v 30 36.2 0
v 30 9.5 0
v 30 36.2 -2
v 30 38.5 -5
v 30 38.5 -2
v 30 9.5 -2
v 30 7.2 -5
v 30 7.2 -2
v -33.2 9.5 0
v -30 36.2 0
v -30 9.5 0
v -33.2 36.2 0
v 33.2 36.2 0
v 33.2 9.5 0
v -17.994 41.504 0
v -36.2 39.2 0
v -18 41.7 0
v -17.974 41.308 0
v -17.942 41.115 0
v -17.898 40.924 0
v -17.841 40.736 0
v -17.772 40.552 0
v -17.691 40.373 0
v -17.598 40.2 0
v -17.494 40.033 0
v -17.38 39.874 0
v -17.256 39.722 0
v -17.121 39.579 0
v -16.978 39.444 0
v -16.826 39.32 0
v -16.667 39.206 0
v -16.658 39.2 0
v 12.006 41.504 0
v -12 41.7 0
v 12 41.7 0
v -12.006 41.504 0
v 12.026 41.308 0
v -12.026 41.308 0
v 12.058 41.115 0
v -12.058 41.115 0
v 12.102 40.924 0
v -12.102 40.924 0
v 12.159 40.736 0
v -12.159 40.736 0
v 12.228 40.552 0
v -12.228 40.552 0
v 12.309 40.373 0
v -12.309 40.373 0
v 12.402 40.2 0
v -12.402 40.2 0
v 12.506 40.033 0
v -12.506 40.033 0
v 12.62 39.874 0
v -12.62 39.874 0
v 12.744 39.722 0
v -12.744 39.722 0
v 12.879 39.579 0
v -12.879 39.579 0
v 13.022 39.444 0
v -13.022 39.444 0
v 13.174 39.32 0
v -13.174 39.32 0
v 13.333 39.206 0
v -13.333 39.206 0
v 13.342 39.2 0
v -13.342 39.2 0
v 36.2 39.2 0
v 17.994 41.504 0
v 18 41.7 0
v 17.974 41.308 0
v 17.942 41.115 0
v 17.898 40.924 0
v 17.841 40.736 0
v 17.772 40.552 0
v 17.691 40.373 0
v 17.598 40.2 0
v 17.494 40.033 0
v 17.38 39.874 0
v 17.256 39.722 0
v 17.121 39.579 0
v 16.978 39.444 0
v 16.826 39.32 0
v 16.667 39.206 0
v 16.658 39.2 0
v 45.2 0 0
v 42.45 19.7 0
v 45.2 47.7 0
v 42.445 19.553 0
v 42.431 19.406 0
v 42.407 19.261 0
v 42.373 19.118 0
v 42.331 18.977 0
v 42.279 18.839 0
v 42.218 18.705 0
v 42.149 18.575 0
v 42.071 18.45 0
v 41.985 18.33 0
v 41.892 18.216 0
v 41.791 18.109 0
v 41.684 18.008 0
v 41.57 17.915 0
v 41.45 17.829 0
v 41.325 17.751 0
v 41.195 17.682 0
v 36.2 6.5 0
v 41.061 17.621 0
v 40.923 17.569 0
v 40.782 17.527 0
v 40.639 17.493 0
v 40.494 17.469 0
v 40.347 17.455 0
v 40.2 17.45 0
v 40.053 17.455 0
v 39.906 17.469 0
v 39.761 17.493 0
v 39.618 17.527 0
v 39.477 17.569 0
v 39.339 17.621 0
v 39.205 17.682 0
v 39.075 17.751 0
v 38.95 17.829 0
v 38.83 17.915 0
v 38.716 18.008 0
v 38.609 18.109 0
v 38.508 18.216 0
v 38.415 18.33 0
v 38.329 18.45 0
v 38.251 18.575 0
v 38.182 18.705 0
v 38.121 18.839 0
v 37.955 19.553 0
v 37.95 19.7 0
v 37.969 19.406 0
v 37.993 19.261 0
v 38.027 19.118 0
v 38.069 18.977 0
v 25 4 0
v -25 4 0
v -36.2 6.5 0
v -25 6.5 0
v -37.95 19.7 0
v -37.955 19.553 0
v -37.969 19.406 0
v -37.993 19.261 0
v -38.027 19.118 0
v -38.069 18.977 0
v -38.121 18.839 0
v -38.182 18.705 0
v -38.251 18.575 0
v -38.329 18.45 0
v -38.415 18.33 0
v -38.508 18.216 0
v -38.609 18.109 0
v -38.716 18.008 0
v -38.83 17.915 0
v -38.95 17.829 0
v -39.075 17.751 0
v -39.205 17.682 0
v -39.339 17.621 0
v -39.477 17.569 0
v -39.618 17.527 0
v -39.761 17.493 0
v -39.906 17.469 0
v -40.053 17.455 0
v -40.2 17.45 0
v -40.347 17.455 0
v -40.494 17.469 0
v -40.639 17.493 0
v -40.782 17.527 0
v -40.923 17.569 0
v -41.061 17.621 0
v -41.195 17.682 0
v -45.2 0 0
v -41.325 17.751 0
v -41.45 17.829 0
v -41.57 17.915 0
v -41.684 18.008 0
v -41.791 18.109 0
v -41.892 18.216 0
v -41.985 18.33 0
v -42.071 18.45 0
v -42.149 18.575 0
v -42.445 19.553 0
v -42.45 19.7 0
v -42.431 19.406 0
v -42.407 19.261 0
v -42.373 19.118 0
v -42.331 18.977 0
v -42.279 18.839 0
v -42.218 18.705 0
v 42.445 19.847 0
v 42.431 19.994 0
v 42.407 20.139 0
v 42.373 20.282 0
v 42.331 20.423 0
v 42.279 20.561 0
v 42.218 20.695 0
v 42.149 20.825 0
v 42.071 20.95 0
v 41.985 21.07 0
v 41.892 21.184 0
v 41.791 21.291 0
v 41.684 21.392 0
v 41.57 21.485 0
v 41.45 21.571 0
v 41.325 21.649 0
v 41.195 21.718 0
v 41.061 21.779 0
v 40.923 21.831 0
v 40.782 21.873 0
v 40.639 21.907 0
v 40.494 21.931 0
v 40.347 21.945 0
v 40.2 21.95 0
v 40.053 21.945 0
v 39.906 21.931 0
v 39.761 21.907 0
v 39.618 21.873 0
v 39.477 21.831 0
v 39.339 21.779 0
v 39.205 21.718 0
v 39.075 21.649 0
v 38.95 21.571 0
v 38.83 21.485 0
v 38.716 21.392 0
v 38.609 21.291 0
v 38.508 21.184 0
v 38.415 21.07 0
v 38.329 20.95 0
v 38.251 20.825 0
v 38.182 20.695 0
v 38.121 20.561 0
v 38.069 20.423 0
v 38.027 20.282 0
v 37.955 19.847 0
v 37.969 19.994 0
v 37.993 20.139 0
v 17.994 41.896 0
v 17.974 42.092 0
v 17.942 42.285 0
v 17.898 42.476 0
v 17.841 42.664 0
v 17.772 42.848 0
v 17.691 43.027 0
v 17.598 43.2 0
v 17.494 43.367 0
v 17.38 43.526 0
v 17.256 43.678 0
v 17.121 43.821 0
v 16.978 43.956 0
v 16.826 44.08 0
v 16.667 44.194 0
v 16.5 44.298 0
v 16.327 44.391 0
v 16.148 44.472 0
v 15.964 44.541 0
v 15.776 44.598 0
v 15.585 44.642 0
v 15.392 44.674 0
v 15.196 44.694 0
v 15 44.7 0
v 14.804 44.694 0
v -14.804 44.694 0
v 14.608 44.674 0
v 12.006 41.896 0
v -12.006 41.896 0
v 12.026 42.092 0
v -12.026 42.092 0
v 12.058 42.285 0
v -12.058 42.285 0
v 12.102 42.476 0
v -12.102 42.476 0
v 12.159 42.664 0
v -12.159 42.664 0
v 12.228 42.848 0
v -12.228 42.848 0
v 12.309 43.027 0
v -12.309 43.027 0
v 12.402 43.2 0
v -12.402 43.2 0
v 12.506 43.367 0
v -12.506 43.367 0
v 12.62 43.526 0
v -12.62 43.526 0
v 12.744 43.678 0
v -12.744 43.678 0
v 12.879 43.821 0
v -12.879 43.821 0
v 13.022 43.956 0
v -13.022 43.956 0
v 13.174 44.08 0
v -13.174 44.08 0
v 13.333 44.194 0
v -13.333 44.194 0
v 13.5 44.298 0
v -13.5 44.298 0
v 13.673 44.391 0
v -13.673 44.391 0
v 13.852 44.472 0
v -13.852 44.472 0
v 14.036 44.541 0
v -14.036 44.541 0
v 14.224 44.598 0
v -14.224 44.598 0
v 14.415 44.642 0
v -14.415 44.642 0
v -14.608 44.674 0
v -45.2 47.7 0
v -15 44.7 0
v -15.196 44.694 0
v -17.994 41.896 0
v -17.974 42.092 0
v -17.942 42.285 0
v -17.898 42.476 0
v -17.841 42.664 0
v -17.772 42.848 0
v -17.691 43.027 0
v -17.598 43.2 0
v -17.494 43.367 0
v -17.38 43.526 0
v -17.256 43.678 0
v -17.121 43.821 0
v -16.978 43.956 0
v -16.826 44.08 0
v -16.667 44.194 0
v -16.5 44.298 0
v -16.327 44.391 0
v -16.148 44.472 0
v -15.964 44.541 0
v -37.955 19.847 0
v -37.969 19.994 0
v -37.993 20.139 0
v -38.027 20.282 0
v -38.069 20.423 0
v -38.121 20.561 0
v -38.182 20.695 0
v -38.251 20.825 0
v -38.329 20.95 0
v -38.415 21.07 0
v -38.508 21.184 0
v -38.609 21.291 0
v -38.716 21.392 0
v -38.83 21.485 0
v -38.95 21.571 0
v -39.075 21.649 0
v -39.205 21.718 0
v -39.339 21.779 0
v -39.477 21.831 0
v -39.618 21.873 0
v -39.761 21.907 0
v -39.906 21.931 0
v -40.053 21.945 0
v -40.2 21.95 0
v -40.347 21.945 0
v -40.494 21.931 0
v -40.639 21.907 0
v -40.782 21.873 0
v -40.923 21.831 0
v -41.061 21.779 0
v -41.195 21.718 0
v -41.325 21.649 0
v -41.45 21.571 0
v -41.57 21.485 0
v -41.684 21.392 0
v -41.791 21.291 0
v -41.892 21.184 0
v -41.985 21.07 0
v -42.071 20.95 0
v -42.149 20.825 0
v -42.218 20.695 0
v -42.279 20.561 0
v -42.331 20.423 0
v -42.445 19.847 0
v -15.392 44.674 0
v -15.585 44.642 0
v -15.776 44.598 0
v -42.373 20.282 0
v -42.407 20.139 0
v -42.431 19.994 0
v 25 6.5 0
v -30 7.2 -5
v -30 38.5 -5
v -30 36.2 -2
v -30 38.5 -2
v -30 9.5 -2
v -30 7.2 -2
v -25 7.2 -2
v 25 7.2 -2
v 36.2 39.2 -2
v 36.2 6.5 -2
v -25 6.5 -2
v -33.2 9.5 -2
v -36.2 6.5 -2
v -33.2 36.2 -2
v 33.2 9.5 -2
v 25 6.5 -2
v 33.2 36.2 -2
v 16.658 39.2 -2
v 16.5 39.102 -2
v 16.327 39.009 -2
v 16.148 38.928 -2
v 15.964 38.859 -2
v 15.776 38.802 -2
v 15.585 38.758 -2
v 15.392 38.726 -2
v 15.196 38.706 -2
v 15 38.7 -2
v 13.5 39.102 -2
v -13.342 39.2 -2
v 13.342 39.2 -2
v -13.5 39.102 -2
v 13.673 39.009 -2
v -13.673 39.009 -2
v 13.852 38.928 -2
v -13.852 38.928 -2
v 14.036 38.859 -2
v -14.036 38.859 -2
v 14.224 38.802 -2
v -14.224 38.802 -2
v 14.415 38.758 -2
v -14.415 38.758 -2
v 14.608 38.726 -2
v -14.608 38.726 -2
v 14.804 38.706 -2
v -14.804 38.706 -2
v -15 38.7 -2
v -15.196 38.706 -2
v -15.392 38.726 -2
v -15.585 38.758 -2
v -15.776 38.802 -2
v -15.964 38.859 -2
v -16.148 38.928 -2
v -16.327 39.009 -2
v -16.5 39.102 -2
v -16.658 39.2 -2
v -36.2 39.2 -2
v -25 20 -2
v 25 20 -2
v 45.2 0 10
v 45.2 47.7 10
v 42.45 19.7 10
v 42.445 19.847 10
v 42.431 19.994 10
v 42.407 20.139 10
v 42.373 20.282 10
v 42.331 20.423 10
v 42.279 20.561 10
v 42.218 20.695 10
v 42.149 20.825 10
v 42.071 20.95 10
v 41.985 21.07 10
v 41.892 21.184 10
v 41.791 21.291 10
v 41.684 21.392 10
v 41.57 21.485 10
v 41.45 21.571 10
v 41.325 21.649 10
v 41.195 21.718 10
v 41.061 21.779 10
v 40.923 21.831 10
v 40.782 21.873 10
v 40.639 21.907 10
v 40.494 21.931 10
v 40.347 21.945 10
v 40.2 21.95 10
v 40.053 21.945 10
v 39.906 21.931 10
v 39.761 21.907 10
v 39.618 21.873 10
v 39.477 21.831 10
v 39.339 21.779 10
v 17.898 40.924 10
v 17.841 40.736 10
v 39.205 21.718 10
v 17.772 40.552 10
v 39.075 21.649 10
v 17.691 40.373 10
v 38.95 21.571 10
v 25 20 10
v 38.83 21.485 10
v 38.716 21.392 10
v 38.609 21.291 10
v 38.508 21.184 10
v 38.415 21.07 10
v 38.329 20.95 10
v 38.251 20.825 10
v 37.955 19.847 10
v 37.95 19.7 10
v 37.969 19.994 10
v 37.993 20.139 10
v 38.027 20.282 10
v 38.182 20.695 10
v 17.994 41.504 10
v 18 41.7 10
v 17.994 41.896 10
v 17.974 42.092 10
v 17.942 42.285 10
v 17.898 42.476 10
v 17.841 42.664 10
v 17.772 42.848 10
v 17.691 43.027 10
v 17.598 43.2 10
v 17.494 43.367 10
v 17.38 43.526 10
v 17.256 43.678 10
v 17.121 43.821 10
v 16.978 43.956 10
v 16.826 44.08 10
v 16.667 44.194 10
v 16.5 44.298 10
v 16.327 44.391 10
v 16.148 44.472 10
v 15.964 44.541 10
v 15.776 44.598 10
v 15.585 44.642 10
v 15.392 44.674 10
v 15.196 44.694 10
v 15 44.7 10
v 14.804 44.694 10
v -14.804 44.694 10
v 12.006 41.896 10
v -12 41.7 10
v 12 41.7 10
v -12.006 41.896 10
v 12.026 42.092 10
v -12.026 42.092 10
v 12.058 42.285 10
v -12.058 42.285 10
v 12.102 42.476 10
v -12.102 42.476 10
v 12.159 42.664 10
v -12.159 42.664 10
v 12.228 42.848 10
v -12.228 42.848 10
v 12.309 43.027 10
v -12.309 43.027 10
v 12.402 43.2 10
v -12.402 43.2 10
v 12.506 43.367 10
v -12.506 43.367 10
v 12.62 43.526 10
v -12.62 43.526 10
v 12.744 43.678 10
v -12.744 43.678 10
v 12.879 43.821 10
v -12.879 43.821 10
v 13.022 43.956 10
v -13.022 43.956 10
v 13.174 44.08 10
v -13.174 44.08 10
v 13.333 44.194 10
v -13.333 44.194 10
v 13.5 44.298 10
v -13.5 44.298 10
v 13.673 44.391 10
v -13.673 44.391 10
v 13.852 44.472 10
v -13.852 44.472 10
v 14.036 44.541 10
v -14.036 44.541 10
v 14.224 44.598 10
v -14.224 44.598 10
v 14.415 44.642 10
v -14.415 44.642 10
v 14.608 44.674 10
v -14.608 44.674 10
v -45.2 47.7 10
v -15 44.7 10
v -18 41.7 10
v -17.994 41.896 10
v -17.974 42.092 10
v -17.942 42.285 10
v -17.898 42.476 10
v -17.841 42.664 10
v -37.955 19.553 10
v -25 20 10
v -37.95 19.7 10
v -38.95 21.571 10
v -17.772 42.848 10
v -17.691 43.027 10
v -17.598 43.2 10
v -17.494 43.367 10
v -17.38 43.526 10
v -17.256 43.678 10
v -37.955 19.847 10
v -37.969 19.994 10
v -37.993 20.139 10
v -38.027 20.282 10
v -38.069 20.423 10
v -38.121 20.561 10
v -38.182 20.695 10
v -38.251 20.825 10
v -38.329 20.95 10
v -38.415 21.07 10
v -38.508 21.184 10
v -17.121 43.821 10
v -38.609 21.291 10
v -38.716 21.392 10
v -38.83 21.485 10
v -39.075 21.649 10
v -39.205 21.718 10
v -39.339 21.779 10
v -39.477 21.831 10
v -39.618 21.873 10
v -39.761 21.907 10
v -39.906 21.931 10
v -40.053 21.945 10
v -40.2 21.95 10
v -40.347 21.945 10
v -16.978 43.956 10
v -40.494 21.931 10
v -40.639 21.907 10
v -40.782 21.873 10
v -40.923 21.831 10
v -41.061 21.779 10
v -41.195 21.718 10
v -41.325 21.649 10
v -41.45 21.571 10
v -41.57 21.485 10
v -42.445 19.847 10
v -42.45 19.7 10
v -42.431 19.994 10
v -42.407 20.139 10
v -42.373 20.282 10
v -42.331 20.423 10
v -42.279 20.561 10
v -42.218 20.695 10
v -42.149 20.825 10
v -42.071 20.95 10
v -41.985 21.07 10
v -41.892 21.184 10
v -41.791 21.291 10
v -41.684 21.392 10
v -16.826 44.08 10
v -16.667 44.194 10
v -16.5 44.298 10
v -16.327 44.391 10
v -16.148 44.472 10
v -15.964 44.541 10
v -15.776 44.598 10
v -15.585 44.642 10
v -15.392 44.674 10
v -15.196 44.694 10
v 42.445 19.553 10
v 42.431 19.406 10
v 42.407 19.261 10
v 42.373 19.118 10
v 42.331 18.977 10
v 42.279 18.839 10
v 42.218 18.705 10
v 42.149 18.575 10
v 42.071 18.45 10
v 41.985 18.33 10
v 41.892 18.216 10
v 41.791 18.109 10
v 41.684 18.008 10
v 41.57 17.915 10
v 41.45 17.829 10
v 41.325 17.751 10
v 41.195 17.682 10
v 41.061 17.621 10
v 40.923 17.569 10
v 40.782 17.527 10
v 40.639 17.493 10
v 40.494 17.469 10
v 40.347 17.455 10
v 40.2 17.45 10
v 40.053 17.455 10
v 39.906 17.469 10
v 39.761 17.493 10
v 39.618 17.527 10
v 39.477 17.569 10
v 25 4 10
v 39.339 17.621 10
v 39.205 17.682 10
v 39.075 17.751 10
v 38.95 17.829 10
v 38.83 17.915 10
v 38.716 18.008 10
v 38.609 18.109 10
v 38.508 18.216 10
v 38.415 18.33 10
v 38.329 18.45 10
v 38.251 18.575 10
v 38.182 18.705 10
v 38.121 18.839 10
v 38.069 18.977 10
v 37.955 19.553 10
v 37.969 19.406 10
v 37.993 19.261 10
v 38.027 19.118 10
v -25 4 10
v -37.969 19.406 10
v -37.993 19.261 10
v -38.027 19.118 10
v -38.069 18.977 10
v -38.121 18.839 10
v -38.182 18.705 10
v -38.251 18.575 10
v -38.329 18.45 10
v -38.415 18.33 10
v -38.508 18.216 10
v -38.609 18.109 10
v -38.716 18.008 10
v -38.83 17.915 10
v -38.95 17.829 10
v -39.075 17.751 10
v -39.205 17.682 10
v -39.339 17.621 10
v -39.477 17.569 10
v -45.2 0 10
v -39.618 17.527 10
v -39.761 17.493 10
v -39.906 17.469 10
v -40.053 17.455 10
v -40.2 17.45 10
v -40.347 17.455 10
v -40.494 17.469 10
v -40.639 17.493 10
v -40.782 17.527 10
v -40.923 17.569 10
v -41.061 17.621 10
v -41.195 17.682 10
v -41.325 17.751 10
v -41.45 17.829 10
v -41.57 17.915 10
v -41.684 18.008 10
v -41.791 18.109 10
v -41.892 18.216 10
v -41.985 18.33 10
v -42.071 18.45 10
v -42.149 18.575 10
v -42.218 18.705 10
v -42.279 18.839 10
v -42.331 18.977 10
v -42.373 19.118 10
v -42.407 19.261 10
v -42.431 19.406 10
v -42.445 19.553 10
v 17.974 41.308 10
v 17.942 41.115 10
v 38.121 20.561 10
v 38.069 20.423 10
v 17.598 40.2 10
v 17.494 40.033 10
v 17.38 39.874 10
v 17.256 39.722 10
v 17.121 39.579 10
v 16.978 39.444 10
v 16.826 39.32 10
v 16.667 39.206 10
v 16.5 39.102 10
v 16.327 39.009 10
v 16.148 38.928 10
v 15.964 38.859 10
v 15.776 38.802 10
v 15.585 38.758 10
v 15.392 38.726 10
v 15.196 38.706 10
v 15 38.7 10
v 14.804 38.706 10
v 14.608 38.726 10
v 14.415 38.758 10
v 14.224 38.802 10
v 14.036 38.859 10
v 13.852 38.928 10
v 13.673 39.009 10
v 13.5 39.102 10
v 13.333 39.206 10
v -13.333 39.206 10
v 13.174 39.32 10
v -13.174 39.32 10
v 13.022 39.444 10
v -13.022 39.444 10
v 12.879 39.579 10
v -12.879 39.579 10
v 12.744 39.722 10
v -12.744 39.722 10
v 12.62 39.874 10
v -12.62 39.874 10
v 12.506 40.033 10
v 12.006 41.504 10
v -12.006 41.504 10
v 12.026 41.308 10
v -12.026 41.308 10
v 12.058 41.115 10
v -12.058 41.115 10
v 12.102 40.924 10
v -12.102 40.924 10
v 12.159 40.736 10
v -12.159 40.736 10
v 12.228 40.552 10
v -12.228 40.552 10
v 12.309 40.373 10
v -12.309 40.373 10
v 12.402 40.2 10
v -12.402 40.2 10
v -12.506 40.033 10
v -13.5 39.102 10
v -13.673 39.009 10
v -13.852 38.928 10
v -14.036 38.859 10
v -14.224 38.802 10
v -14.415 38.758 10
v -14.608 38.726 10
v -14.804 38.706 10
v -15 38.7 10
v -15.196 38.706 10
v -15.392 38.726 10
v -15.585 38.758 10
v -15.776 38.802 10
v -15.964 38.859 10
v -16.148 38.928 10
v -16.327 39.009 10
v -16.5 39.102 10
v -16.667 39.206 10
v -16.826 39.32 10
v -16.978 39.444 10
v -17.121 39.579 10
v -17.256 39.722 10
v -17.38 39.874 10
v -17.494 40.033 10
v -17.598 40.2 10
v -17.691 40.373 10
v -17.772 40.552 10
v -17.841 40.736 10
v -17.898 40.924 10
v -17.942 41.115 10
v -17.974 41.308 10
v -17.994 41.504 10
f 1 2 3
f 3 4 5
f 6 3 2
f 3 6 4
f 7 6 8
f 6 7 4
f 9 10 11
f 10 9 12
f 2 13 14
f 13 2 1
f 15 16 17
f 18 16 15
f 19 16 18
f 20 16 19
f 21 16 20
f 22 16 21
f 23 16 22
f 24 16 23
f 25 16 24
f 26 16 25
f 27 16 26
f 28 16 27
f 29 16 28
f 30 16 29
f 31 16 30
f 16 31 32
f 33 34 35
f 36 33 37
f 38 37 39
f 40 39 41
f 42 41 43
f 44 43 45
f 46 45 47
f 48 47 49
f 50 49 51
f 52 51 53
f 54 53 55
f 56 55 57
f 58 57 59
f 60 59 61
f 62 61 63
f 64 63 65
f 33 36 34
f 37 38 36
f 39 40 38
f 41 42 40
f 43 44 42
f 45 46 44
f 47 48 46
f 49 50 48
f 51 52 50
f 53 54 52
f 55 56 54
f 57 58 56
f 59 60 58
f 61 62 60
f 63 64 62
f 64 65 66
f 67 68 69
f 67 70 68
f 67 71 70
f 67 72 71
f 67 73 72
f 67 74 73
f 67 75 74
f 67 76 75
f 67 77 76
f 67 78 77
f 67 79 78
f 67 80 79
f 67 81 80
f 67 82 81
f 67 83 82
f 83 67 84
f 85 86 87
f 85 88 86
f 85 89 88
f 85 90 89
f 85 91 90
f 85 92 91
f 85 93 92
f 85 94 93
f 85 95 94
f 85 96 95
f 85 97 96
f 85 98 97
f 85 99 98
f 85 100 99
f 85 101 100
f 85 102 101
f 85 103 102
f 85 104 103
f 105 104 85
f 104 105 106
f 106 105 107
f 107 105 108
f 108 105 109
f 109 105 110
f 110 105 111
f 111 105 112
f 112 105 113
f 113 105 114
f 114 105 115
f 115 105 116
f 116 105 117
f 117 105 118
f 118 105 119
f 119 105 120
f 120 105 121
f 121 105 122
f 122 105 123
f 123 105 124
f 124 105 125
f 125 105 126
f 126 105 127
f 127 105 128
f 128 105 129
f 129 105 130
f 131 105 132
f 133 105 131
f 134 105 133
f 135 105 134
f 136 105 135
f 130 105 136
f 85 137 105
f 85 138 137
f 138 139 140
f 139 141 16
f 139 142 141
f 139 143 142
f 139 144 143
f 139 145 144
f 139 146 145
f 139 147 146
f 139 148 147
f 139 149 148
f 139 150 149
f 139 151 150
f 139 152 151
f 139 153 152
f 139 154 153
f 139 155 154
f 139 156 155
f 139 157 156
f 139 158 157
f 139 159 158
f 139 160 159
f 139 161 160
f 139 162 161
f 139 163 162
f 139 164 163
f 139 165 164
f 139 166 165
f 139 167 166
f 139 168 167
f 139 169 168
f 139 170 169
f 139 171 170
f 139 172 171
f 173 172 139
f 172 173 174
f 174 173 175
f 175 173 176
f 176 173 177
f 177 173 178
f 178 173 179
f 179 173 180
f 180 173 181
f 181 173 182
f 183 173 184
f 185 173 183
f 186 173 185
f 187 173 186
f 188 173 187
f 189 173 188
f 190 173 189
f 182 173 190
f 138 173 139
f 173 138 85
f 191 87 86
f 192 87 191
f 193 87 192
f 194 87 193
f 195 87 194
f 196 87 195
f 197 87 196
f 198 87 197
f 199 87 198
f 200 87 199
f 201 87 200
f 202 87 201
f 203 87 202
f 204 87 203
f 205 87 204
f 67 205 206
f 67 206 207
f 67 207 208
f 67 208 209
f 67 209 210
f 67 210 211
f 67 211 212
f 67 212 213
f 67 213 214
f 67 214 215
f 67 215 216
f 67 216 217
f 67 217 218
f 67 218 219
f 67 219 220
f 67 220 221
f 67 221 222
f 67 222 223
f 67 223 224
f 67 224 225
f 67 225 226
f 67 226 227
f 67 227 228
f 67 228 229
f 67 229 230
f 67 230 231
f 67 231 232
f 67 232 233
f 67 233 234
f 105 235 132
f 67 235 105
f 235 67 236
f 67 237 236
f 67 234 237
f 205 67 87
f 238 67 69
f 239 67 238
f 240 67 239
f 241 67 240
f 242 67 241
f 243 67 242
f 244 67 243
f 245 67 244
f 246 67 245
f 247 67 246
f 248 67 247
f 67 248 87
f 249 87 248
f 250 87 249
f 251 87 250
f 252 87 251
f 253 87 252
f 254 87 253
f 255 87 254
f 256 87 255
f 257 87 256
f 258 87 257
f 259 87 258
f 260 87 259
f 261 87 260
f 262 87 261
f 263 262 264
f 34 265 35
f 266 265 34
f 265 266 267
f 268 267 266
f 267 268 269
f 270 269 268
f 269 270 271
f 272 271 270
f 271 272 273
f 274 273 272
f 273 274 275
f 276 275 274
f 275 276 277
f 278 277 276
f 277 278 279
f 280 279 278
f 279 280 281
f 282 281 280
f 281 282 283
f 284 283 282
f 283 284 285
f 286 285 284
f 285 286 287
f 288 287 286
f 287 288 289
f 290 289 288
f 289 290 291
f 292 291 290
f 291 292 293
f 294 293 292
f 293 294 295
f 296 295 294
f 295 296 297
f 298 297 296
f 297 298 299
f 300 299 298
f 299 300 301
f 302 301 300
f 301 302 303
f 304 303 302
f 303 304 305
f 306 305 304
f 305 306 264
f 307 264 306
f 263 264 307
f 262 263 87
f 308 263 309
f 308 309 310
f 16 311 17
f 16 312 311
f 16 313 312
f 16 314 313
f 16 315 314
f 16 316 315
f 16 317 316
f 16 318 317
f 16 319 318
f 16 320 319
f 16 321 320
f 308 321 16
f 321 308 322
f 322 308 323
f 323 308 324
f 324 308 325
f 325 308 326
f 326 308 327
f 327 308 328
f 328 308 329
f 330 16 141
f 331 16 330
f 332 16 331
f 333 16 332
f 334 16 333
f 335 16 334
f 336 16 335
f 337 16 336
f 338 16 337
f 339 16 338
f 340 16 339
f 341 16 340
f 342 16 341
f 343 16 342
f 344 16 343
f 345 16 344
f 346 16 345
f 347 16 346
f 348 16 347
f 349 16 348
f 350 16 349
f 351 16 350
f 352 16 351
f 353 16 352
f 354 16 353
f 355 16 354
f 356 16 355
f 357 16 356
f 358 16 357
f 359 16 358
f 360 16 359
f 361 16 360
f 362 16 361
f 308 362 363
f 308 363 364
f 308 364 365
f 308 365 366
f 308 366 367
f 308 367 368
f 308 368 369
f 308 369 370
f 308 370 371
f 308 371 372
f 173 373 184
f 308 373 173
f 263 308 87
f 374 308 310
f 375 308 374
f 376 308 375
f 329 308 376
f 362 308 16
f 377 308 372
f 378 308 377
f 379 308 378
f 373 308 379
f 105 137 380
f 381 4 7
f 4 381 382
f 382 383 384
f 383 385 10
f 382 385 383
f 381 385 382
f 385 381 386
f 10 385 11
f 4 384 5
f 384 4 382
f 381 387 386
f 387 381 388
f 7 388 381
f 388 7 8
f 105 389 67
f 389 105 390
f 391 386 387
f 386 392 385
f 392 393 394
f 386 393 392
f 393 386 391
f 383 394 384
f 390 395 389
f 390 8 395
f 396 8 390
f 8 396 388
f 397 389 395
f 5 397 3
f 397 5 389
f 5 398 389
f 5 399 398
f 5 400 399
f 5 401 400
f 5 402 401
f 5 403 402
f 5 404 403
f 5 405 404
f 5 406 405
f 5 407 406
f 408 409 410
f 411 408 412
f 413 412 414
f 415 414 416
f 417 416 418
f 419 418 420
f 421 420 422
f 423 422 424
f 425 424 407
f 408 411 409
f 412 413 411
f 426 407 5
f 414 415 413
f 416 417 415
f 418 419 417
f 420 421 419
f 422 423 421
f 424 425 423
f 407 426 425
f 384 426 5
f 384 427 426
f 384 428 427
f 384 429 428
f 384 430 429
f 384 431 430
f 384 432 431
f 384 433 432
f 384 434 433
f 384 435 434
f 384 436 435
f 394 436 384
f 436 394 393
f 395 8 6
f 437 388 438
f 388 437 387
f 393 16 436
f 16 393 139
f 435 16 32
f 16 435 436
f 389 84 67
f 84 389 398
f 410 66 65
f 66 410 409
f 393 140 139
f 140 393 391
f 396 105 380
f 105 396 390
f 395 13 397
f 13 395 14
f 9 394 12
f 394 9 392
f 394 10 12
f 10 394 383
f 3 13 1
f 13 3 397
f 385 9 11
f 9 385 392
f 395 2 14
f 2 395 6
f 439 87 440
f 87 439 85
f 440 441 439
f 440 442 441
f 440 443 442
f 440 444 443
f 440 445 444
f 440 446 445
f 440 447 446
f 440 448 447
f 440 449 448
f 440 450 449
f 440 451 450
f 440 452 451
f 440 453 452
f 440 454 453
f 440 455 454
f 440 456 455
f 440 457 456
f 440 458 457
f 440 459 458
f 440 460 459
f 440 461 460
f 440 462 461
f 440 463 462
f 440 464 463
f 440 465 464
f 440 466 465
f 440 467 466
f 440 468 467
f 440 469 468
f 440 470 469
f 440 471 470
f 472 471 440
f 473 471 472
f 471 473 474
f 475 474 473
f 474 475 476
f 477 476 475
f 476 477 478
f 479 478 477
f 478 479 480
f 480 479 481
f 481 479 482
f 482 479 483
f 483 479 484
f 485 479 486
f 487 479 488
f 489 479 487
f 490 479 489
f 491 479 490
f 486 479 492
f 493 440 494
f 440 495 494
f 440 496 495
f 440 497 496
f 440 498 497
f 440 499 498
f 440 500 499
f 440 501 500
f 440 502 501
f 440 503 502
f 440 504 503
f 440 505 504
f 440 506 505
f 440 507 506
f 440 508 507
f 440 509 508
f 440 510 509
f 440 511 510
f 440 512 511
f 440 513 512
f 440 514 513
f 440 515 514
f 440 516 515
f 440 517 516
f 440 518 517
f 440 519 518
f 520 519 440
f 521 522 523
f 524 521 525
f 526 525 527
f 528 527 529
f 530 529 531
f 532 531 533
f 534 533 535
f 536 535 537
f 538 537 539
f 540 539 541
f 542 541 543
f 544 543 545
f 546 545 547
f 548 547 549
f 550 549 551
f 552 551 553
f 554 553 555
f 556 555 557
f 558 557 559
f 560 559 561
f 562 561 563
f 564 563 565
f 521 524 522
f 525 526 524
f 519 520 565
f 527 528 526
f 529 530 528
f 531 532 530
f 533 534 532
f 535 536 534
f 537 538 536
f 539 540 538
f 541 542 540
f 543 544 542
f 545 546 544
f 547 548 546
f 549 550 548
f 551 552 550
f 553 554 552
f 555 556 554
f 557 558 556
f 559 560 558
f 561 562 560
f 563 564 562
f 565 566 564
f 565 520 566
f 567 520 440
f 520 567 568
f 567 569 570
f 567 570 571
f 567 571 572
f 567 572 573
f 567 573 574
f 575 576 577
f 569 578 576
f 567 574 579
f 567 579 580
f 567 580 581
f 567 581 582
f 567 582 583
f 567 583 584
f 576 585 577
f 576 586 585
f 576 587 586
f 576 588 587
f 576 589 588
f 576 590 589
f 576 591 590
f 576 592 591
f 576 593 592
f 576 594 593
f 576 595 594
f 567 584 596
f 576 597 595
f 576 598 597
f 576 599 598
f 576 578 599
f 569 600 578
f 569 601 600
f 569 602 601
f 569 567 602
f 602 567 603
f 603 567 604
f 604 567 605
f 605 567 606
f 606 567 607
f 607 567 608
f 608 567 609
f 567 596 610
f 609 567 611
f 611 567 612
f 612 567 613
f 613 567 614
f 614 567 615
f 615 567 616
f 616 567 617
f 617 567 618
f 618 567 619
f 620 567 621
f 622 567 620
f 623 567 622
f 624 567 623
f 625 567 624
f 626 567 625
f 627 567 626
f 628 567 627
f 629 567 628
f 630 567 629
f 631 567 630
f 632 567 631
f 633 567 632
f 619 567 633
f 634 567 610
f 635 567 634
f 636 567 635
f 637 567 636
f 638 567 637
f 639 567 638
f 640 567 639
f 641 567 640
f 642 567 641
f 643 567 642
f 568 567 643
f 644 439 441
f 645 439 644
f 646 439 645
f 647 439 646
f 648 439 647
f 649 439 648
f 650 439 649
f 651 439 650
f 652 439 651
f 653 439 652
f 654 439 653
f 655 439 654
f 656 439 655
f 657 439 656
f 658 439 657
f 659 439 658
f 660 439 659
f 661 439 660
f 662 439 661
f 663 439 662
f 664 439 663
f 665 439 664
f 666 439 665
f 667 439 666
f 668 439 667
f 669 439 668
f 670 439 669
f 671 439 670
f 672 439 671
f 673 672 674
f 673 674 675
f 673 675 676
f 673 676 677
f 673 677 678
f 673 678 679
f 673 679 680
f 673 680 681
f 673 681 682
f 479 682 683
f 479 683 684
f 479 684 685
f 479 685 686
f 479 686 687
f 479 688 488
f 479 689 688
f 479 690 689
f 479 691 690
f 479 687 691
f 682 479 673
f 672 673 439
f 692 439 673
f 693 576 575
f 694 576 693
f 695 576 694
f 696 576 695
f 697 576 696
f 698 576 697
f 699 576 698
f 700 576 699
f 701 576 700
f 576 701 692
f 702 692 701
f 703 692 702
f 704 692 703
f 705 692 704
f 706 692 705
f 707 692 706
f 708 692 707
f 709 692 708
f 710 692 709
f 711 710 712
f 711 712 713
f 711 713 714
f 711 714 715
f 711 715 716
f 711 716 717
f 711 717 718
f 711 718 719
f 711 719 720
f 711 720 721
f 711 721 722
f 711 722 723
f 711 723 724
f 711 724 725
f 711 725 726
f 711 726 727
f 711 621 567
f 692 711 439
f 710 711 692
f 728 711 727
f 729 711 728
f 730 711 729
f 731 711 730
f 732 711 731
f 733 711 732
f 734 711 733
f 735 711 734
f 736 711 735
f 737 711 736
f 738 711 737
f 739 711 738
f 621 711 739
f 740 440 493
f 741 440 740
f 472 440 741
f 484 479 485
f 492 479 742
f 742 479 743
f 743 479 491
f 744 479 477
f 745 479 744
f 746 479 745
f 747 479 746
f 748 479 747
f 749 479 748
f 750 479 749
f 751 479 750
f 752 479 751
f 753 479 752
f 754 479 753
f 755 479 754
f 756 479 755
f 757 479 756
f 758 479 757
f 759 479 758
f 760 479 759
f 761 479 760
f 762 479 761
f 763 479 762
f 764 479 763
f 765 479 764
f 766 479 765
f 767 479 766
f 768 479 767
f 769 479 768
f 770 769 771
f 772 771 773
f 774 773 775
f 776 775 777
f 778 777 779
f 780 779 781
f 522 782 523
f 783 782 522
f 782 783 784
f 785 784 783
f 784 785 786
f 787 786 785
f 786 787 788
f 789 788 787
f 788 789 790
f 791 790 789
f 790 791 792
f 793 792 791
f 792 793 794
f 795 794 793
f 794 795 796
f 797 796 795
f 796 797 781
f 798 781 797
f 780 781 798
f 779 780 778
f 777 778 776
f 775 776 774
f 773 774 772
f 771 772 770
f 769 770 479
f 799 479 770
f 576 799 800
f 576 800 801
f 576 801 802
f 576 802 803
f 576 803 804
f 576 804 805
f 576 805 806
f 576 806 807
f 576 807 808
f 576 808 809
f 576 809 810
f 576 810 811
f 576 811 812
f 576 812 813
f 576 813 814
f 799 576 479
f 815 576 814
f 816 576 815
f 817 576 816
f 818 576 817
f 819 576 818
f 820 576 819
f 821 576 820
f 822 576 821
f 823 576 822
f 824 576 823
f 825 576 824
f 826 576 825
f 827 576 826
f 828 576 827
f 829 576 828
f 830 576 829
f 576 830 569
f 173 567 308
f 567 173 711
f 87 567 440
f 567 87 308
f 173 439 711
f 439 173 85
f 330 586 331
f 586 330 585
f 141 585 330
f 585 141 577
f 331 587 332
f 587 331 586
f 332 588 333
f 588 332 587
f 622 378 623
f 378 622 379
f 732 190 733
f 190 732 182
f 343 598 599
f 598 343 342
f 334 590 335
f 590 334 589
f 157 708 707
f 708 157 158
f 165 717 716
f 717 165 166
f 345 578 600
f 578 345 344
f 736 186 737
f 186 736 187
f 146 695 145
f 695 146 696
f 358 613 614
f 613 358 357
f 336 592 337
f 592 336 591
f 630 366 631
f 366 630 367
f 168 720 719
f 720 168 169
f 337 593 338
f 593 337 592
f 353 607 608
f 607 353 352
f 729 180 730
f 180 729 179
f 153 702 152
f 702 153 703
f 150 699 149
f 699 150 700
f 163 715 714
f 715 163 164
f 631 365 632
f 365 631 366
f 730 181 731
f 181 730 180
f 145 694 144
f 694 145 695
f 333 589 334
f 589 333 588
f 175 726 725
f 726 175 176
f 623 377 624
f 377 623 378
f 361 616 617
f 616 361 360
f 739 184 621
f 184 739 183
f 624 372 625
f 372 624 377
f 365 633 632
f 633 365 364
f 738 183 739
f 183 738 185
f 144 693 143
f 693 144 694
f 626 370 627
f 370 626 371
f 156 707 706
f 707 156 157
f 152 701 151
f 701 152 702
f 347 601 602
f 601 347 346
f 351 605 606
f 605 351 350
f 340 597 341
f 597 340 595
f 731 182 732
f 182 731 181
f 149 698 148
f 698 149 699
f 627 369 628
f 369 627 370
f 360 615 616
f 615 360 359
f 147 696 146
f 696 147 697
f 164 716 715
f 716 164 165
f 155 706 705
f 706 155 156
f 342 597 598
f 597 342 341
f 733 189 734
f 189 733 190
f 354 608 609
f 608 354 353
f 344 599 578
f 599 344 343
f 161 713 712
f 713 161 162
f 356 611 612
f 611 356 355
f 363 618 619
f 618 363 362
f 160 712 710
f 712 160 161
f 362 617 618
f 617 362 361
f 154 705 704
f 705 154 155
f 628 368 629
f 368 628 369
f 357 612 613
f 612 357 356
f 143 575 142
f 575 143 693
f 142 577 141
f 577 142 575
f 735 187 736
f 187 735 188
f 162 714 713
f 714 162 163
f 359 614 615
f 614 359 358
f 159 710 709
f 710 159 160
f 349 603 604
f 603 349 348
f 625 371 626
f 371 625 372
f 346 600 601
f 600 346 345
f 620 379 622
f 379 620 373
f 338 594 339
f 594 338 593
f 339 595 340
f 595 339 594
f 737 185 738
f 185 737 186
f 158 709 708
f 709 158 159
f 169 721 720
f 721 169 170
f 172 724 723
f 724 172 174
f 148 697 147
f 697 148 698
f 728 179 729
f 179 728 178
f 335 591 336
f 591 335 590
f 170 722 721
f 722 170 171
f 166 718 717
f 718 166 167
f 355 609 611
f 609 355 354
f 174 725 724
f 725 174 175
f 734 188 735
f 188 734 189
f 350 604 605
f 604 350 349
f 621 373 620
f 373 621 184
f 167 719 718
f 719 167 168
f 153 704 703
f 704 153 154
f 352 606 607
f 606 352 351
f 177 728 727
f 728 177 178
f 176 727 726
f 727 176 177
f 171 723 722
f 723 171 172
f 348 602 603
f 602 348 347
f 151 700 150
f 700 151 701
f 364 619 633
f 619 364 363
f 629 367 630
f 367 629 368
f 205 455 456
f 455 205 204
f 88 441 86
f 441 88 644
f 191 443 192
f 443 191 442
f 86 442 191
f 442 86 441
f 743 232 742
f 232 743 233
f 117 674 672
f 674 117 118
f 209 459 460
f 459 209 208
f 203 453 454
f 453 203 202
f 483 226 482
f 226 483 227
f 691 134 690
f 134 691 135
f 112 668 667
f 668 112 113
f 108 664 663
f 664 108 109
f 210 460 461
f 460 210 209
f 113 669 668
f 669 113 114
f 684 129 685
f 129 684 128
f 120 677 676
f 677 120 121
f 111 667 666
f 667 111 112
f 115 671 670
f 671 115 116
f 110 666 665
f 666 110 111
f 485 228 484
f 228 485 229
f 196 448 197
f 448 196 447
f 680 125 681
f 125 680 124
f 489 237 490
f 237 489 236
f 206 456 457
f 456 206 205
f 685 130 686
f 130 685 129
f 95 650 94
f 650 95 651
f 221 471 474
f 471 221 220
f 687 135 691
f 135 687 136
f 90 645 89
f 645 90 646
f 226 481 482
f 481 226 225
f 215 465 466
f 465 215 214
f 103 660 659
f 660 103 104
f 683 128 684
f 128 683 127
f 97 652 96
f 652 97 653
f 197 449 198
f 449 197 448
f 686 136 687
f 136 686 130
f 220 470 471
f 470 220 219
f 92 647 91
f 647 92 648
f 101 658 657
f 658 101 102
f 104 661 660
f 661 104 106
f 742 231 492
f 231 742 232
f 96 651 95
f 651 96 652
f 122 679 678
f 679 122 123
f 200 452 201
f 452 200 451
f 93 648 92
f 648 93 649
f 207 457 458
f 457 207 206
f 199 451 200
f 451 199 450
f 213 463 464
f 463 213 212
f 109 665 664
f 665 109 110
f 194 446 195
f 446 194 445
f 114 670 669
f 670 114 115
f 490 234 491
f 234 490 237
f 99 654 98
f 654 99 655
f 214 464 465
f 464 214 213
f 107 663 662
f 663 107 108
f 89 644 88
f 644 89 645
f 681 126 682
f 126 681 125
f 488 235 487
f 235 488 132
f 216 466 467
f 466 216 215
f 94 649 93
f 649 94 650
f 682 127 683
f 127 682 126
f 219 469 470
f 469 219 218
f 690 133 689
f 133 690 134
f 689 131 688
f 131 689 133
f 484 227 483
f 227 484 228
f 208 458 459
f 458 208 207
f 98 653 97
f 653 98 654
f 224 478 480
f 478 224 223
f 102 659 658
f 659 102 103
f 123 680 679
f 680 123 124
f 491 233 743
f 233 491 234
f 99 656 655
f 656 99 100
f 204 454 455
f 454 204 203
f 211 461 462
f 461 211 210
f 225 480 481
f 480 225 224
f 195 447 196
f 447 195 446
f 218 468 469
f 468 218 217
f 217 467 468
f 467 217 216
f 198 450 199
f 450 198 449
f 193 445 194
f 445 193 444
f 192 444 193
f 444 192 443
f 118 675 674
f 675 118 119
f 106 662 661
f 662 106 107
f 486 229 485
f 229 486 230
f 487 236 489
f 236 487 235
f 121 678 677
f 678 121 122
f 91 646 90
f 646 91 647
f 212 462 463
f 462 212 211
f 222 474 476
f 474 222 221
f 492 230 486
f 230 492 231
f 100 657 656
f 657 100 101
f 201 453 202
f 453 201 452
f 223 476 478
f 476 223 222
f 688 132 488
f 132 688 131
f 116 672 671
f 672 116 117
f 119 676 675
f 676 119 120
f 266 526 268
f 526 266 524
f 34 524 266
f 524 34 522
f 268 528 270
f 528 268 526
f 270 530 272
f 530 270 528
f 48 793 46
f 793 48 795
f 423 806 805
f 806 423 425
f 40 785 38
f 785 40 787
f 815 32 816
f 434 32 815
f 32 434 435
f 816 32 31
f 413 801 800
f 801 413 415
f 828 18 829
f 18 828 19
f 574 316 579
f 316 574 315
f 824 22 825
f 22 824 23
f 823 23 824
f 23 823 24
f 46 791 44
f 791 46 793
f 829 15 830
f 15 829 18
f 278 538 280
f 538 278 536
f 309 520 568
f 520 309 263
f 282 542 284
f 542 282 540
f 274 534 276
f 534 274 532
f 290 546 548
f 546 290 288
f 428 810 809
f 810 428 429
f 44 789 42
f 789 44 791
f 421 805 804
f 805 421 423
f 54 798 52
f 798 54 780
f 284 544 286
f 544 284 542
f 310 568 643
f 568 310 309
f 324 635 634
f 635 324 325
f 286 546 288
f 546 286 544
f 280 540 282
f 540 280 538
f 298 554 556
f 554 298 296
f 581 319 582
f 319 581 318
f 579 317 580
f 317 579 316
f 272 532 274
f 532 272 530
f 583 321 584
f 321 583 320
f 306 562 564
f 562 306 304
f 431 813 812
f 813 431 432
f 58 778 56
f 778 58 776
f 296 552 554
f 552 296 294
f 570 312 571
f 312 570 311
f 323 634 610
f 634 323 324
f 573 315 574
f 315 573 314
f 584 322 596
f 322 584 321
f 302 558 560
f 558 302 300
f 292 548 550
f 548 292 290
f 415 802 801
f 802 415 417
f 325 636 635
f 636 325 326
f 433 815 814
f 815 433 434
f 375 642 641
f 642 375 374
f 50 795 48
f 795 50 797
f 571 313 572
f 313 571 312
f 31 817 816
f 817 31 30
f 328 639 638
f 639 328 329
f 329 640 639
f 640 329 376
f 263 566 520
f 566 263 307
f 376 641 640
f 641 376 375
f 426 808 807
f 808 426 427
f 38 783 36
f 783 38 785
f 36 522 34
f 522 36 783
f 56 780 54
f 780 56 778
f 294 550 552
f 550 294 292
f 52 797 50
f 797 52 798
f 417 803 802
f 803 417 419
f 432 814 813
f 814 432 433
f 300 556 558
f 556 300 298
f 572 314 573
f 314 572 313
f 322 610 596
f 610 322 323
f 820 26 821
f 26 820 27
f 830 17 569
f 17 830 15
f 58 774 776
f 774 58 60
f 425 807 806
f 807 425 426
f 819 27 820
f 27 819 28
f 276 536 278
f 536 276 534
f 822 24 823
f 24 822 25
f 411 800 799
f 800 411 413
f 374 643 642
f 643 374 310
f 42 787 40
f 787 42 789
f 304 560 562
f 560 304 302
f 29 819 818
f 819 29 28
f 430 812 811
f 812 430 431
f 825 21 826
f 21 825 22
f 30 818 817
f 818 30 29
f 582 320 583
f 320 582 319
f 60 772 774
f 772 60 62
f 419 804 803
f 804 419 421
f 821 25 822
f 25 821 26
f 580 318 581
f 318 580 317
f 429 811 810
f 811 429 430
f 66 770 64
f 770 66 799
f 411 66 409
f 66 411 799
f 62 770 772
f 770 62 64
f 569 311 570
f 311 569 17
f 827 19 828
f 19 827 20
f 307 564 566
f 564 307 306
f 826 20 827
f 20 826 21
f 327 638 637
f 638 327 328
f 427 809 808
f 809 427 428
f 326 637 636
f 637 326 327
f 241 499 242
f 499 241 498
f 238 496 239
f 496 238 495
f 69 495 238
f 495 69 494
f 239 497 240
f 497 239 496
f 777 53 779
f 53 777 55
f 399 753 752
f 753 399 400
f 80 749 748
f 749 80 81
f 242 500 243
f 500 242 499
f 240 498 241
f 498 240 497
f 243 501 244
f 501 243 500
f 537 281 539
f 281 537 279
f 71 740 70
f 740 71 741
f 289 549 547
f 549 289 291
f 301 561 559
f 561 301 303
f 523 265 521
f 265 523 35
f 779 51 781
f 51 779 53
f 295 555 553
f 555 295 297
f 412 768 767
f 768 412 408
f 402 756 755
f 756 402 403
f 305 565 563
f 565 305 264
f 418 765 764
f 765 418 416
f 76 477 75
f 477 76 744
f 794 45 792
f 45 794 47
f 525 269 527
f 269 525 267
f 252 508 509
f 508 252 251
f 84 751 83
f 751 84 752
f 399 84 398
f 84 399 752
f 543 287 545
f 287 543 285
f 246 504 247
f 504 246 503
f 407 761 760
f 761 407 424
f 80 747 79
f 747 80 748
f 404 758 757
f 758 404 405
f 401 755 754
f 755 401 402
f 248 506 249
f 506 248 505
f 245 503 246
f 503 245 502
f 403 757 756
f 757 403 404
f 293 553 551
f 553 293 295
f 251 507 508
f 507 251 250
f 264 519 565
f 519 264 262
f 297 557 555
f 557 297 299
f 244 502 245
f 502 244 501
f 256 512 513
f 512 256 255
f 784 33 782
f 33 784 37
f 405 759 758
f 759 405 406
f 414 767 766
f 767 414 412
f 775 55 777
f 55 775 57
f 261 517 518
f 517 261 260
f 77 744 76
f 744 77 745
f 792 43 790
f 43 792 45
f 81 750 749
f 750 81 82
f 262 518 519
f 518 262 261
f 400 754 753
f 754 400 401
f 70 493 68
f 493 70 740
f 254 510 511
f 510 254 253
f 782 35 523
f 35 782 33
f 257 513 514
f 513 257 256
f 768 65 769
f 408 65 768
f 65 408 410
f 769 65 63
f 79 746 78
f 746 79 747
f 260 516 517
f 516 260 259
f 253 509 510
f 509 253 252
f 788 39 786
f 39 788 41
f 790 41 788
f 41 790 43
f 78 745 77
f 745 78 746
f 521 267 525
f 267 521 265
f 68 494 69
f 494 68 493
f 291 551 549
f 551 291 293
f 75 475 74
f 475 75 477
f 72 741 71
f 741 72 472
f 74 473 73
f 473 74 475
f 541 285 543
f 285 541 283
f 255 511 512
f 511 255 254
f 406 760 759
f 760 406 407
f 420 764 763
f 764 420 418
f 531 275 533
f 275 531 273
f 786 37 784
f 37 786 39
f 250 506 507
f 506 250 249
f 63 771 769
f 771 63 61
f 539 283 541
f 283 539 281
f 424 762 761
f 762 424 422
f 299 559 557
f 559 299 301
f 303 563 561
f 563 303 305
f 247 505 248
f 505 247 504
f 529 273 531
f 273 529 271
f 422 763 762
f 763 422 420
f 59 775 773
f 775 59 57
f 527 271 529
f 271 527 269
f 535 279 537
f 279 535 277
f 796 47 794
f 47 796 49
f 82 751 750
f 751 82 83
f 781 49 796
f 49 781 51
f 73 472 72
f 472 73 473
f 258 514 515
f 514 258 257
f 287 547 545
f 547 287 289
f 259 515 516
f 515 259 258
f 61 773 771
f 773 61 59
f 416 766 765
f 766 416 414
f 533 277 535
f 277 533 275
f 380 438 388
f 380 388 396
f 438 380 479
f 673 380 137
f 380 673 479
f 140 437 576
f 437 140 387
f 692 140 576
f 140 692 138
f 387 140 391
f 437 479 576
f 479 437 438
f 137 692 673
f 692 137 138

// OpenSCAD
// =====================================================================
// child_cam_lid.scad — カメラポッド 押え蓋 (2個印刷)
//
// child_shell_fwd のカメラポッドに落とし込んだ DJI Osmo Action 6 を
// 上から押さえる。M4 蝶ボルト 2 本で着脱 (数秒)。
// 押えパッドの下面に 2mm EVA スポンジを貼り、締めると 0.6mm 潰れて
// カメラをポッド底の位置決めパッドへ押し付ける = Z の再現性が出る。
//
// 座標系 (この部品のローカル):
//   x = 0    : ポッドの X 中心 (レンズ軸。lens_dx=0 のとき)
//   y = 0    : ポッド後壁の外面
//   z = 0    : ポッド側壁の上端 (child_shell_fwd の pod_top)
//   → アセンブリでは translate([±75, 70.3, 145]) で置く
//
// 印刷向き: **上下逆さま** (z=lid_t の平面をベッドに置く)。
//   押えパッド・位置決めリムが上を向き、サポート不要。
// =====================================================================

/* [カメラ / ポッド (child_shell_fwd と一致させること)] */
cam_w     = 72.8;
cam_h     = 47.2;
cam_d     = 33.1;
cam_clr   = 0.6;
lens_y    = 110;
cam_ax_z  = 115;
pod_wall  = 7;
pod_rear  = 6;
hood      = 8;
pod_top   = 145;
lid_sc_y  = 90;             // 蓋ねじの y (グローバル)

/* [蓋] */
lid_t     = 10;             // 板厚
lid_ov    = 1.5;            // ポッド側壁より外へ出す量 (ねじの端距離 + 水切り)
m4_d      = 4.5;            // M4 蝶ボルト クリアランス
base_line = 150;            // 外形枠チェック用 (child_shell_fwd と一致)
foam_t    = 2.0;            // 押えパッドに貼る EVA スポンジ厚
preload   = 0.6;            // 締結時のスポンジ潰し代
pad_w     = 26;             // 押えパッド 幅 (Y)
pad_hw    = 30;             // 同 半幅 (X)
rim_t     = 3;              // 位置決めリム 幅
rim_h     = 2;              // 同 高さ
rim_clr   = 0.5;            // 同 クレードルとのすきま (片側)

/* [上面ボタンのアクセス窓 — 位置は要実測] */
win_on    = true;
win_hw    = 25;             // 半幅 (X)
win_y0    = 4;              // y 範囲 (ポッド後壁外面から)
win_y1    = 20;

$fn = 96;

// ---- 導出 -----------------------------------------------------------
in_hw    = (cam_w + cam_clr)/2;          // 36.7 クレードル内 半幅
in_y0    = lens_y - cam_d - cam_clr;     // 76.3 クレードル内 後端
pod_y0   = in_y0 - pod_rear;             // 70.3 ポッド後壁 外面 (= ローカル y=0)
lid_hw   = in_hw + pod_wall + lid_ov;    // 45.2
lid_len  = lens_y + hood - pod_y0;       // 47.7
cam_top  = cam_ax_z + cam_h/2;           // 138.6 カメラ上面 (グローバル z)
gap      = pod_top - cam_top;            // 6.4  蓋下面 → カメラ上面
pad_h    = gap - foam_t + preload;       // 押えパッド 高さ
sc_x     = in_hw + pod_wall/2;           // 40.2 蓋ねじ x (側壁の肉厚中心)
sc_y     = lid_sc_y - pod_y0;            // 19.7 同 y (ローカル)
rim_x    = in_hw - rim_clr;              // 位置決めリム 外側 x
rim_y0   = in_y0 - pod_y0 + rim_clr;     // 同 y 範囲 (クレードル内)
rim_y1   = lens_y - pod_y0 - rim_clr;

// ---- 干渉・成立性チェック --------------------------------------------
assert(pad_h > 1.5, str("押えパッドが低すぎる (", pad_h, "mm)。pod_top を上げること"));
assert(pad_h + foam_t - preload == gap, "押え代の計算が合っていない");
assert(rim_h < gap - 1, str("位置決めリムがカメラ上面に当たる: rim_h=", rim_h, " gap=", gap));
assert(sc_x - m4_d/2 > in_hw + 0.5,
       str("蓋ねじがクレードル内腔に掛かる: ", sc_x - m4_d/2, " <= ", in_hw));
assert(sc_x + m4_d/2 < lid_hw - 2,
       str("蓋ねじの外側端距離不足: 残り ", lid_hw - sc_x - m4_d/2, "mm。lid_ov を増やすこと"));
// 蓋はポッドより少しだけ広い。機体の最大幅を決めるのでここで枠を確認する
assert(2*(base_line/2 + lid_hw) <= 250,
       str("蓋込みの全幅 ", 2*(base_line/2 + lid_hw), " が 250 超"));
assert(sc_y > 4 && sc_y < lid_len - 4, "蓋ねじの y 端距離不足");
assert(pad_hw + 1 < in_hw, "押えパッドがクレードルより広い (蓋が入らない)");
// rim_x はリムの**外側端**。クレードル内幅より小さければ落とし込める
assert(rim_x < in_hw - 0.2,
       str("位置決めリムがクレードルに入らない: ", rim_x, " >= ", in_hw));
assert(rim_t >= 2 && rim_t < 6, "位置決めリムの幅が不適当");
if (win_on) {
    assert(win_hw + 2 < rim_x - rim_t, "アクセス窓が位置決めリムに掛かる");
    assert(win_y1 < rim_y1 - 2 && win_y0 > rim_y0 - 4, "アクセス窓が位置決めリムに掛かる (Y)");
    assert(win_hw + 3 < sc_x - m4_d/2 || win_y1 + 3 < sc_y || win_y0 - 3 > sc_y,
           "アクセス窓が蓋ねじに掛かる");
}

// ---- 本体 -------------------------------------------------------------
difference() {
    union() {
        translate([-lid_hw, 0, 0]) cube([2*lid_hw, lid_len, lid_t]);
        // 押えパッド x2 (下面。EVA スポンジを貼る面)
        for (py = [rim_y0 + 6, rim_y1 - 6 - pad_w])
            translate([-pad_hw, py, -pad_h]) cube([2*pad_hw, pad_w, pad_h]);
        // 位置決めリム (クレードルに落として蓋の XY を決める。カメラには当たらない)
        difference() {
            translate([-rim_x, rim_y0, -rim_h]) cube([2*rim_x, rim_y1-rim_y0, rim_h]);
            translate([-rim_x+rim_t, rim_y0+rim_t, -rim_h-1])
                cube([2*(rim_x-rim_t), rim_y1-rim_y0-2*rim_t, rim_h+2]);
        }
    }
    // M4 蝶ボルト 通し穴
    for (sx=[-1,1]) translate([sx*sc_x, sc_y, -pad_h-2]) cylinder(d=m4_d, h=lid_t+pad_h+4);
    // 上面ボタンのアクセス窓 (位置は要実測。win_on=false で塞げる)
    if (win_on)
        translate([-win_hw, win_y0, -2]) cube([2*win_hw, win_y1-win_y0, lid_t+4]);
    // 水抜き・通水
    for (sx=[-1,1]) translate([sx*15, lid_len-6, -2]) cylinder(d=6, h=lid_t+4);
}

echo(str("蓋 ", 2*lid_hw, " x ", lid_len, " x ", lid_t, " (パッド込み高さ ", lid_t+pad_h, ")"));
echo(str("押えパッド高さ=", pad_h, " + EVA ", foam_t, "mm → 潰し代 ", preload));
echo(str("アセンブリ配置: translate([±(base_line/2 - lens_dx), ", pod_y0, ", ", pod_top, "])"));
